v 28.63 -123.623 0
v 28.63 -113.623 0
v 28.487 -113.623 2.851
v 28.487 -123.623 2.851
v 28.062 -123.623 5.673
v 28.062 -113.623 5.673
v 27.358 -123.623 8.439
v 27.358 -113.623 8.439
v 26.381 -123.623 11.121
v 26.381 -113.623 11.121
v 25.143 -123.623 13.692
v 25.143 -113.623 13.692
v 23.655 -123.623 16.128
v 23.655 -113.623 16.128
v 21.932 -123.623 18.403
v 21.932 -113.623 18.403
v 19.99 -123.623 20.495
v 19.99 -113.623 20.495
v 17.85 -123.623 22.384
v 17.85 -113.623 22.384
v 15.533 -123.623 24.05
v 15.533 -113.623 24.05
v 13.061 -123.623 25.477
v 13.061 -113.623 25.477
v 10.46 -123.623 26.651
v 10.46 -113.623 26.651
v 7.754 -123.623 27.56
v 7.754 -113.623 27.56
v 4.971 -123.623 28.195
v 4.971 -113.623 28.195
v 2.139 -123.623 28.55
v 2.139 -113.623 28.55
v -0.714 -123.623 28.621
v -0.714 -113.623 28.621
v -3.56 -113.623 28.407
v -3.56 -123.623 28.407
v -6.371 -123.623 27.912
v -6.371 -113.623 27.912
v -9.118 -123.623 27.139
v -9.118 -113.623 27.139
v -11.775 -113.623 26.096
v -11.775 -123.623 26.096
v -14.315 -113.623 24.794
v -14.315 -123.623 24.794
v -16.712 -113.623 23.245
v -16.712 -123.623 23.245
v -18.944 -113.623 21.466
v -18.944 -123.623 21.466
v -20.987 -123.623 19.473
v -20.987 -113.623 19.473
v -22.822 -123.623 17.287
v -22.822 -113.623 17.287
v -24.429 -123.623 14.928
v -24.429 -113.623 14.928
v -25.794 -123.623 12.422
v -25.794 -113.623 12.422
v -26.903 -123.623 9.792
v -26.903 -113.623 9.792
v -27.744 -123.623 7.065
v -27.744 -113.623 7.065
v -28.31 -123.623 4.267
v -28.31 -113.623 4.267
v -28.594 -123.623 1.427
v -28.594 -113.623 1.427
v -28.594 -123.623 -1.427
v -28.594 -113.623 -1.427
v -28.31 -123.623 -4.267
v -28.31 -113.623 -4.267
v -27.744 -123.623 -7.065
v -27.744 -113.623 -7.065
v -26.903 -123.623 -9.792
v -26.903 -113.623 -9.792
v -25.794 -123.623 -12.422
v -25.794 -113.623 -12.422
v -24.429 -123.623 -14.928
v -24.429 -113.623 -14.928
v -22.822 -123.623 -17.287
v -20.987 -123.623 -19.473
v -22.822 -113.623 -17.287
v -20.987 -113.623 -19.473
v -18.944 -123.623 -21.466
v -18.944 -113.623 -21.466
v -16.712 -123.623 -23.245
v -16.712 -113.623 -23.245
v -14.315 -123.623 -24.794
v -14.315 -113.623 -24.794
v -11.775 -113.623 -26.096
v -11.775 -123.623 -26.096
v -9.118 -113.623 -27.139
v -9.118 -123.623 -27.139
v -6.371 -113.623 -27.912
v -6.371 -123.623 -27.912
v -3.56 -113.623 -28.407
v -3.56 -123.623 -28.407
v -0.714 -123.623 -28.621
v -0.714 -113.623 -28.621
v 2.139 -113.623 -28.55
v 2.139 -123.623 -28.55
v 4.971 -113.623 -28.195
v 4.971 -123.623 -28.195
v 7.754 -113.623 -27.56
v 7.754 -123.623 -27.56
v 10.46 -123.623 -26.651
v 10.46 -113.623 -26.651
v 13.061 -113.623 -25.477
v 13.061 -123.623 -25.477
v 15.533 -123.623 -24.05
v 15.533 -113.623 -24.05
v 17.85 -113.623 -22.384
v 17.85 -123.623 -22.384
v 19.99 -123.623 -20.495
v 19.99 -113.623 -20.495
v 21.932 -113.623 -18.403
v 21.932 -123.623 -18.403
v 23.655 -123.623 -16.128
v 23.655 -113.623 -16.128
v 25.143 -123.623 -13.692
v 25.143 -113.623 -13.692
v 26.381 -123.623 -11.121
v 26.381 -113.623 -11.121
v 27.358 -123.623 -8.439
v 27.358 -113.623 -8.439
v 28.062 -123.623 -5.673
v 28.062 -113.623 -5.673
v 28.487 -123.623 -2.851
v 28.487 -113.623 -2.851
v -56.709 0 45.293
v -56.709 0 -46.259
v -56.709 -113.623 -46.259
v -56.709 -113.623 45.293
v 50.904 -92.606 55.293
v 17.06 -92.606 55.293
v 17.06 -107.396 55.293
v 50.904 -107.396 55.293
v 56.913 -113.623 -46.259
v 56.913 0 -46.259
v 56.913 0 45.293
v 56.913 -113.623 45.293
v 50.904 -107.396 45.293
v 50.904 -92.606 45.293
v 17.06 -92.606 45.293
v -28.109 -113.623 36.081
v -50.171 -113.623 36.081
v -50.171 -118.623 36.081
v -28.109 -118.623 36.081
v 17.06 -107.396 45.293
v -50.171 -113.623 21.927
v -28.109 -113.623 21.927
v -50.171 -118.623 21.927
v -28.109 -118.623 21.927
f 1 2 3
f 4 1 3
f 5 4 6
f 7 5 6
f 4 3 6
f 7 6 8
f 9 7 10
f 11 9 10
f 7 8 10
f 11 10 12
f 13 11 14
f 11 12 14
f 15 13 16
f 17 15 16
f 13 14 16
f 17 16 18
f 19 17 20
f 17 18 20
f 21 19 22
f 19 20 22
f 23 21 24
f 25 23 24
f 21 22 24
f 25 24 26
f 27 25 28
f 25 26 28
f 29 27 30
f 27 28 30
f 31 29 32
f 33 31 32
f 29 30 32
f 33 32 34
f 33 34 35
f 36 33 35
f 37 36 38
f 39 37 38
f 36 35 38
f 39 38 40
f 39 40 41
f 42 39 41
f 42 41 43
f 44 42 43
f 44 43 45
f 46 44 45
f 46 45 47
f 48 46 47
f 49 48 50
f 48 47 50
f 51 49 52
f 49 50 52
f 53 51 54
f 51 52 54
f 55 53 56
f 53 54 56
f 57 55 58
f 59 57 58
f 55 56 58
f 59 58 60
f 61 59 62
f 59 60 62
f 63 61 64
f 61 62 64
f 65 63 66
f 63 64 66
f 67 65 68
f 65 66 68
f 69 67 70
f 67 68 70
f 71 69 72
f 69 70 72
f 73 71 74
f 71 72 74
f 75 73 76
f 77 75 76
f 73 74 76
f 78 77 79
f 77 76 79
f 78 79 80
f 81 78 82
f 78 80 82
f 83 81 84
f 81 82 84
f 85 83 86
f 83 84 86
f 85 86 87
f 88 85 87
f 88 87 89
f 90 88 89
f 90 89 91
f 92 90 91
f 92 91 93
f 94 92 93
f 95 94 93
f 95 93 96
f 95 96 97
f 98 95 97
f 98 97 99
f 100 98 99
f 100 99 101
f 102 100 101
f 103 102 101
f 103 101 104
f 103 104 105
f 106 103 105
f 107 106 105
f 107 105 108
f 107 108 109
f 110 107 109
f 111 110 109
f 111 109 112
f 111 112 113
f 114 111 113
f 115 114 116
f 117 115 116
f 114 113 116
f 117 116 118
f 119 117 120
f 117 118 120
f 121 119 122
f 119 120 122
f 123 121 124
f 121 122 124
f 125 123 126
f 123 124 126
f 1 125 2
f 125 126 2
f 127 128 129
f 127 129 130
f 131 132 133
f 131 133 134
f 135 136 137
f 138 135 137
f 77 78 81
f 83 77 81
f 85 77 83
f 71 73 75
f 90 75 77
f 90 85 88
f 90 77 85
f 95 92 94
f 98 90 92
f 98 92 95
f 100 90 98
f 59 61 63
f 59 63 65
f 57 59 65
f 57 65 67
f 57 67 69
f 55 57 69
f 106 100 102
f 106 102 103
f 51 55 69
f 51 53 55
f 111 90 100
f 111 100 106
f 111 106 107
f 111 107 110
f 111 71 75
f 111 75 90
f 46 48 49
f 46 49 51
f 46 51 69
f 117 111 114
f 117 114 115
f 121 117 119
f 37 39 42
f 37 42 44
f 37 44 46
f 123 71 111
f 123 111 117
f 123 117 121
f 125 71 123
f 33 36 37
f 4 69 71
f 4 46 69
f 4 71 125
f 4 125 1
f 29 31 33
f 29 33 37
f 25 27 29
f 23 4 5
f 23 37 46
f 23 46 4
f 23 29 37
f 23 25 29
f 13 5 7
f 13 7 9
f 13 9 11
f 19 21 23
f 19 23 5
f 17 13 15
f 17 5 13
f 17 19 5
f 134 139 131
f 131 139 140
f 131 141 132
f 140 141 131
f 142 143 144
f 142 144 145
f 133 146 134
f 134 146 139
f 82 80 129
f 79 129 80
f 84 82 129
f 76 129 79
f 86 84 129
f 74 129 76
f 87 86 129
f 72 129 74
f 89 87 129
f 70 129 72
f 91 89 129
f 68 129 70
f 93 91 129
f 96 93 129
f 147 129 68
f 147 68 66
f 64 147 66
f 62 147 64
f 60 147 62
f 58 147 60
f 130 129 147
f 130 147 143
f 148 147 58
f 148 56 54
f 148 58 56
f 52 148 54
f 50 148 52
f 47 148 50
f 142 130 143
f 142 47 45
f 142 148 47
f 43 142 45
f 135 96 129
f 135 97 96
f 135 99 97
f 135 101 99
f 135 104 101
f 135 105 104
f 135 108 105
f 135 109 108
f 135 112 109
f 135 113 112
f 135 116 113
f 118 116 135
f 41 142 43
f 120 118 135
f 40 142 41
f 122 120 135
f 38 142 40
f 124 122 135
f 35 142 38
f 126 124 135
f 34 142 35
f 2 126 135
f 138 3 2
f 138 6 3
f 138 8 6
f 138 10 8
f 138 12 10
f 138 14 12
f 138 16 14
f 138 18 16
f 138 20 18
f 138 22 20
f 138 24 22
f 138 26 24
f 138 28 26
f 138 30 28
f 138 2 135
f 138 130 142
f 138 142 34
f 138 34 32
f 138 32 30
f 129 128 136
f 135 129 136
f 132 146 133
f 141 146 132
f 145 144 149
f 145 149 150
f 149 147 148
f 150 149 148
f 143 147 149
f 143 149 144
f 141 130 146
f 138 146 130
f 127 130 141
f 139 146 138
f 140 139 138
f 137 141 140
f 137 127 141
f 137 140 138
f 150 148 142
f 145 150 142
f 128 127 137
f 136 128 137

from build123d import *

# Parameters (mm, degrees)
F0_W      = 113.6225089431
F0_H      = 91.5519557893
F1_DEPTH  = 113.62251
F2_R      = 28.629575464
F3_DEPTH  = 10
F4_DEPTH  = 18
F7_W      = 33.8436812162
F7_H      = 14.7902220488
F8_DEPTH  = 10
F9_W      = 22.0619104803
F9_H      = 14.1544528306
F10_DEPTH = 5
F11_W     = 113.6225089431
F11_H     = 91.5519557893
F12_DEPTH = 60


# Not quite as in the source:
# - the program builds the solid bodies; features that only make, move or delete a surface that nothing else refers to are left out


with BuildPart() as f1:
    # F0 (on Front) → F1 (new body)
    with BuildSketch(Plane.XZ):
        with Locations((0.1021772623, -0.4832614213)):
            Rectangle(F0_W, F0_H)
    extrude(amount=F1_DEPTH)

    # F2 (on face) → F3 (join)
    with BuildSketch(Plane.XZ.offset(113.62251)):
        Circle(F2_R)
    extrude(amount=F3_DEPTH)

    # F4 (add): a face of the model
    f4_faces = [f1.faces().sort_by_distance(p)[0] for p in [
        (0, -123.62251, 0),
    ]]
    extrude(f4_faces, amount=-F4_DEPTH)

    # F7 (on face) → F8 (join)
    with BuildSketch(Plane.XY.offset(45.2927164733)):
        with Locations((33.9821465313, -100.0008359551)):
            Rectangle(F7_W, F7_H)
    extrude(amount=F8_DEPTH)

    # F9 (on face) → F10 (join)
    with BuildSketch(Plane.XZ.offset(113.62251)):
        with Locations((-39.1396004707, 29.0038492531)):
            Rectangle(F9_W, F9_H)
    extrude(amount=F10_DEPTH)

    # F11 (on face) → F12 (join)
    with BuildSketch(Plane(origin=(0, 0, 0), x_dir=(-1, 0, 0), z_dir=(0, 1, 0))):
        with Locations((-0.1021772623, -0.4832614213)):
            Rectangle(F11_W, F11_H)
    extrude(amount=-F12_DEPTH)


solid = f1.part
